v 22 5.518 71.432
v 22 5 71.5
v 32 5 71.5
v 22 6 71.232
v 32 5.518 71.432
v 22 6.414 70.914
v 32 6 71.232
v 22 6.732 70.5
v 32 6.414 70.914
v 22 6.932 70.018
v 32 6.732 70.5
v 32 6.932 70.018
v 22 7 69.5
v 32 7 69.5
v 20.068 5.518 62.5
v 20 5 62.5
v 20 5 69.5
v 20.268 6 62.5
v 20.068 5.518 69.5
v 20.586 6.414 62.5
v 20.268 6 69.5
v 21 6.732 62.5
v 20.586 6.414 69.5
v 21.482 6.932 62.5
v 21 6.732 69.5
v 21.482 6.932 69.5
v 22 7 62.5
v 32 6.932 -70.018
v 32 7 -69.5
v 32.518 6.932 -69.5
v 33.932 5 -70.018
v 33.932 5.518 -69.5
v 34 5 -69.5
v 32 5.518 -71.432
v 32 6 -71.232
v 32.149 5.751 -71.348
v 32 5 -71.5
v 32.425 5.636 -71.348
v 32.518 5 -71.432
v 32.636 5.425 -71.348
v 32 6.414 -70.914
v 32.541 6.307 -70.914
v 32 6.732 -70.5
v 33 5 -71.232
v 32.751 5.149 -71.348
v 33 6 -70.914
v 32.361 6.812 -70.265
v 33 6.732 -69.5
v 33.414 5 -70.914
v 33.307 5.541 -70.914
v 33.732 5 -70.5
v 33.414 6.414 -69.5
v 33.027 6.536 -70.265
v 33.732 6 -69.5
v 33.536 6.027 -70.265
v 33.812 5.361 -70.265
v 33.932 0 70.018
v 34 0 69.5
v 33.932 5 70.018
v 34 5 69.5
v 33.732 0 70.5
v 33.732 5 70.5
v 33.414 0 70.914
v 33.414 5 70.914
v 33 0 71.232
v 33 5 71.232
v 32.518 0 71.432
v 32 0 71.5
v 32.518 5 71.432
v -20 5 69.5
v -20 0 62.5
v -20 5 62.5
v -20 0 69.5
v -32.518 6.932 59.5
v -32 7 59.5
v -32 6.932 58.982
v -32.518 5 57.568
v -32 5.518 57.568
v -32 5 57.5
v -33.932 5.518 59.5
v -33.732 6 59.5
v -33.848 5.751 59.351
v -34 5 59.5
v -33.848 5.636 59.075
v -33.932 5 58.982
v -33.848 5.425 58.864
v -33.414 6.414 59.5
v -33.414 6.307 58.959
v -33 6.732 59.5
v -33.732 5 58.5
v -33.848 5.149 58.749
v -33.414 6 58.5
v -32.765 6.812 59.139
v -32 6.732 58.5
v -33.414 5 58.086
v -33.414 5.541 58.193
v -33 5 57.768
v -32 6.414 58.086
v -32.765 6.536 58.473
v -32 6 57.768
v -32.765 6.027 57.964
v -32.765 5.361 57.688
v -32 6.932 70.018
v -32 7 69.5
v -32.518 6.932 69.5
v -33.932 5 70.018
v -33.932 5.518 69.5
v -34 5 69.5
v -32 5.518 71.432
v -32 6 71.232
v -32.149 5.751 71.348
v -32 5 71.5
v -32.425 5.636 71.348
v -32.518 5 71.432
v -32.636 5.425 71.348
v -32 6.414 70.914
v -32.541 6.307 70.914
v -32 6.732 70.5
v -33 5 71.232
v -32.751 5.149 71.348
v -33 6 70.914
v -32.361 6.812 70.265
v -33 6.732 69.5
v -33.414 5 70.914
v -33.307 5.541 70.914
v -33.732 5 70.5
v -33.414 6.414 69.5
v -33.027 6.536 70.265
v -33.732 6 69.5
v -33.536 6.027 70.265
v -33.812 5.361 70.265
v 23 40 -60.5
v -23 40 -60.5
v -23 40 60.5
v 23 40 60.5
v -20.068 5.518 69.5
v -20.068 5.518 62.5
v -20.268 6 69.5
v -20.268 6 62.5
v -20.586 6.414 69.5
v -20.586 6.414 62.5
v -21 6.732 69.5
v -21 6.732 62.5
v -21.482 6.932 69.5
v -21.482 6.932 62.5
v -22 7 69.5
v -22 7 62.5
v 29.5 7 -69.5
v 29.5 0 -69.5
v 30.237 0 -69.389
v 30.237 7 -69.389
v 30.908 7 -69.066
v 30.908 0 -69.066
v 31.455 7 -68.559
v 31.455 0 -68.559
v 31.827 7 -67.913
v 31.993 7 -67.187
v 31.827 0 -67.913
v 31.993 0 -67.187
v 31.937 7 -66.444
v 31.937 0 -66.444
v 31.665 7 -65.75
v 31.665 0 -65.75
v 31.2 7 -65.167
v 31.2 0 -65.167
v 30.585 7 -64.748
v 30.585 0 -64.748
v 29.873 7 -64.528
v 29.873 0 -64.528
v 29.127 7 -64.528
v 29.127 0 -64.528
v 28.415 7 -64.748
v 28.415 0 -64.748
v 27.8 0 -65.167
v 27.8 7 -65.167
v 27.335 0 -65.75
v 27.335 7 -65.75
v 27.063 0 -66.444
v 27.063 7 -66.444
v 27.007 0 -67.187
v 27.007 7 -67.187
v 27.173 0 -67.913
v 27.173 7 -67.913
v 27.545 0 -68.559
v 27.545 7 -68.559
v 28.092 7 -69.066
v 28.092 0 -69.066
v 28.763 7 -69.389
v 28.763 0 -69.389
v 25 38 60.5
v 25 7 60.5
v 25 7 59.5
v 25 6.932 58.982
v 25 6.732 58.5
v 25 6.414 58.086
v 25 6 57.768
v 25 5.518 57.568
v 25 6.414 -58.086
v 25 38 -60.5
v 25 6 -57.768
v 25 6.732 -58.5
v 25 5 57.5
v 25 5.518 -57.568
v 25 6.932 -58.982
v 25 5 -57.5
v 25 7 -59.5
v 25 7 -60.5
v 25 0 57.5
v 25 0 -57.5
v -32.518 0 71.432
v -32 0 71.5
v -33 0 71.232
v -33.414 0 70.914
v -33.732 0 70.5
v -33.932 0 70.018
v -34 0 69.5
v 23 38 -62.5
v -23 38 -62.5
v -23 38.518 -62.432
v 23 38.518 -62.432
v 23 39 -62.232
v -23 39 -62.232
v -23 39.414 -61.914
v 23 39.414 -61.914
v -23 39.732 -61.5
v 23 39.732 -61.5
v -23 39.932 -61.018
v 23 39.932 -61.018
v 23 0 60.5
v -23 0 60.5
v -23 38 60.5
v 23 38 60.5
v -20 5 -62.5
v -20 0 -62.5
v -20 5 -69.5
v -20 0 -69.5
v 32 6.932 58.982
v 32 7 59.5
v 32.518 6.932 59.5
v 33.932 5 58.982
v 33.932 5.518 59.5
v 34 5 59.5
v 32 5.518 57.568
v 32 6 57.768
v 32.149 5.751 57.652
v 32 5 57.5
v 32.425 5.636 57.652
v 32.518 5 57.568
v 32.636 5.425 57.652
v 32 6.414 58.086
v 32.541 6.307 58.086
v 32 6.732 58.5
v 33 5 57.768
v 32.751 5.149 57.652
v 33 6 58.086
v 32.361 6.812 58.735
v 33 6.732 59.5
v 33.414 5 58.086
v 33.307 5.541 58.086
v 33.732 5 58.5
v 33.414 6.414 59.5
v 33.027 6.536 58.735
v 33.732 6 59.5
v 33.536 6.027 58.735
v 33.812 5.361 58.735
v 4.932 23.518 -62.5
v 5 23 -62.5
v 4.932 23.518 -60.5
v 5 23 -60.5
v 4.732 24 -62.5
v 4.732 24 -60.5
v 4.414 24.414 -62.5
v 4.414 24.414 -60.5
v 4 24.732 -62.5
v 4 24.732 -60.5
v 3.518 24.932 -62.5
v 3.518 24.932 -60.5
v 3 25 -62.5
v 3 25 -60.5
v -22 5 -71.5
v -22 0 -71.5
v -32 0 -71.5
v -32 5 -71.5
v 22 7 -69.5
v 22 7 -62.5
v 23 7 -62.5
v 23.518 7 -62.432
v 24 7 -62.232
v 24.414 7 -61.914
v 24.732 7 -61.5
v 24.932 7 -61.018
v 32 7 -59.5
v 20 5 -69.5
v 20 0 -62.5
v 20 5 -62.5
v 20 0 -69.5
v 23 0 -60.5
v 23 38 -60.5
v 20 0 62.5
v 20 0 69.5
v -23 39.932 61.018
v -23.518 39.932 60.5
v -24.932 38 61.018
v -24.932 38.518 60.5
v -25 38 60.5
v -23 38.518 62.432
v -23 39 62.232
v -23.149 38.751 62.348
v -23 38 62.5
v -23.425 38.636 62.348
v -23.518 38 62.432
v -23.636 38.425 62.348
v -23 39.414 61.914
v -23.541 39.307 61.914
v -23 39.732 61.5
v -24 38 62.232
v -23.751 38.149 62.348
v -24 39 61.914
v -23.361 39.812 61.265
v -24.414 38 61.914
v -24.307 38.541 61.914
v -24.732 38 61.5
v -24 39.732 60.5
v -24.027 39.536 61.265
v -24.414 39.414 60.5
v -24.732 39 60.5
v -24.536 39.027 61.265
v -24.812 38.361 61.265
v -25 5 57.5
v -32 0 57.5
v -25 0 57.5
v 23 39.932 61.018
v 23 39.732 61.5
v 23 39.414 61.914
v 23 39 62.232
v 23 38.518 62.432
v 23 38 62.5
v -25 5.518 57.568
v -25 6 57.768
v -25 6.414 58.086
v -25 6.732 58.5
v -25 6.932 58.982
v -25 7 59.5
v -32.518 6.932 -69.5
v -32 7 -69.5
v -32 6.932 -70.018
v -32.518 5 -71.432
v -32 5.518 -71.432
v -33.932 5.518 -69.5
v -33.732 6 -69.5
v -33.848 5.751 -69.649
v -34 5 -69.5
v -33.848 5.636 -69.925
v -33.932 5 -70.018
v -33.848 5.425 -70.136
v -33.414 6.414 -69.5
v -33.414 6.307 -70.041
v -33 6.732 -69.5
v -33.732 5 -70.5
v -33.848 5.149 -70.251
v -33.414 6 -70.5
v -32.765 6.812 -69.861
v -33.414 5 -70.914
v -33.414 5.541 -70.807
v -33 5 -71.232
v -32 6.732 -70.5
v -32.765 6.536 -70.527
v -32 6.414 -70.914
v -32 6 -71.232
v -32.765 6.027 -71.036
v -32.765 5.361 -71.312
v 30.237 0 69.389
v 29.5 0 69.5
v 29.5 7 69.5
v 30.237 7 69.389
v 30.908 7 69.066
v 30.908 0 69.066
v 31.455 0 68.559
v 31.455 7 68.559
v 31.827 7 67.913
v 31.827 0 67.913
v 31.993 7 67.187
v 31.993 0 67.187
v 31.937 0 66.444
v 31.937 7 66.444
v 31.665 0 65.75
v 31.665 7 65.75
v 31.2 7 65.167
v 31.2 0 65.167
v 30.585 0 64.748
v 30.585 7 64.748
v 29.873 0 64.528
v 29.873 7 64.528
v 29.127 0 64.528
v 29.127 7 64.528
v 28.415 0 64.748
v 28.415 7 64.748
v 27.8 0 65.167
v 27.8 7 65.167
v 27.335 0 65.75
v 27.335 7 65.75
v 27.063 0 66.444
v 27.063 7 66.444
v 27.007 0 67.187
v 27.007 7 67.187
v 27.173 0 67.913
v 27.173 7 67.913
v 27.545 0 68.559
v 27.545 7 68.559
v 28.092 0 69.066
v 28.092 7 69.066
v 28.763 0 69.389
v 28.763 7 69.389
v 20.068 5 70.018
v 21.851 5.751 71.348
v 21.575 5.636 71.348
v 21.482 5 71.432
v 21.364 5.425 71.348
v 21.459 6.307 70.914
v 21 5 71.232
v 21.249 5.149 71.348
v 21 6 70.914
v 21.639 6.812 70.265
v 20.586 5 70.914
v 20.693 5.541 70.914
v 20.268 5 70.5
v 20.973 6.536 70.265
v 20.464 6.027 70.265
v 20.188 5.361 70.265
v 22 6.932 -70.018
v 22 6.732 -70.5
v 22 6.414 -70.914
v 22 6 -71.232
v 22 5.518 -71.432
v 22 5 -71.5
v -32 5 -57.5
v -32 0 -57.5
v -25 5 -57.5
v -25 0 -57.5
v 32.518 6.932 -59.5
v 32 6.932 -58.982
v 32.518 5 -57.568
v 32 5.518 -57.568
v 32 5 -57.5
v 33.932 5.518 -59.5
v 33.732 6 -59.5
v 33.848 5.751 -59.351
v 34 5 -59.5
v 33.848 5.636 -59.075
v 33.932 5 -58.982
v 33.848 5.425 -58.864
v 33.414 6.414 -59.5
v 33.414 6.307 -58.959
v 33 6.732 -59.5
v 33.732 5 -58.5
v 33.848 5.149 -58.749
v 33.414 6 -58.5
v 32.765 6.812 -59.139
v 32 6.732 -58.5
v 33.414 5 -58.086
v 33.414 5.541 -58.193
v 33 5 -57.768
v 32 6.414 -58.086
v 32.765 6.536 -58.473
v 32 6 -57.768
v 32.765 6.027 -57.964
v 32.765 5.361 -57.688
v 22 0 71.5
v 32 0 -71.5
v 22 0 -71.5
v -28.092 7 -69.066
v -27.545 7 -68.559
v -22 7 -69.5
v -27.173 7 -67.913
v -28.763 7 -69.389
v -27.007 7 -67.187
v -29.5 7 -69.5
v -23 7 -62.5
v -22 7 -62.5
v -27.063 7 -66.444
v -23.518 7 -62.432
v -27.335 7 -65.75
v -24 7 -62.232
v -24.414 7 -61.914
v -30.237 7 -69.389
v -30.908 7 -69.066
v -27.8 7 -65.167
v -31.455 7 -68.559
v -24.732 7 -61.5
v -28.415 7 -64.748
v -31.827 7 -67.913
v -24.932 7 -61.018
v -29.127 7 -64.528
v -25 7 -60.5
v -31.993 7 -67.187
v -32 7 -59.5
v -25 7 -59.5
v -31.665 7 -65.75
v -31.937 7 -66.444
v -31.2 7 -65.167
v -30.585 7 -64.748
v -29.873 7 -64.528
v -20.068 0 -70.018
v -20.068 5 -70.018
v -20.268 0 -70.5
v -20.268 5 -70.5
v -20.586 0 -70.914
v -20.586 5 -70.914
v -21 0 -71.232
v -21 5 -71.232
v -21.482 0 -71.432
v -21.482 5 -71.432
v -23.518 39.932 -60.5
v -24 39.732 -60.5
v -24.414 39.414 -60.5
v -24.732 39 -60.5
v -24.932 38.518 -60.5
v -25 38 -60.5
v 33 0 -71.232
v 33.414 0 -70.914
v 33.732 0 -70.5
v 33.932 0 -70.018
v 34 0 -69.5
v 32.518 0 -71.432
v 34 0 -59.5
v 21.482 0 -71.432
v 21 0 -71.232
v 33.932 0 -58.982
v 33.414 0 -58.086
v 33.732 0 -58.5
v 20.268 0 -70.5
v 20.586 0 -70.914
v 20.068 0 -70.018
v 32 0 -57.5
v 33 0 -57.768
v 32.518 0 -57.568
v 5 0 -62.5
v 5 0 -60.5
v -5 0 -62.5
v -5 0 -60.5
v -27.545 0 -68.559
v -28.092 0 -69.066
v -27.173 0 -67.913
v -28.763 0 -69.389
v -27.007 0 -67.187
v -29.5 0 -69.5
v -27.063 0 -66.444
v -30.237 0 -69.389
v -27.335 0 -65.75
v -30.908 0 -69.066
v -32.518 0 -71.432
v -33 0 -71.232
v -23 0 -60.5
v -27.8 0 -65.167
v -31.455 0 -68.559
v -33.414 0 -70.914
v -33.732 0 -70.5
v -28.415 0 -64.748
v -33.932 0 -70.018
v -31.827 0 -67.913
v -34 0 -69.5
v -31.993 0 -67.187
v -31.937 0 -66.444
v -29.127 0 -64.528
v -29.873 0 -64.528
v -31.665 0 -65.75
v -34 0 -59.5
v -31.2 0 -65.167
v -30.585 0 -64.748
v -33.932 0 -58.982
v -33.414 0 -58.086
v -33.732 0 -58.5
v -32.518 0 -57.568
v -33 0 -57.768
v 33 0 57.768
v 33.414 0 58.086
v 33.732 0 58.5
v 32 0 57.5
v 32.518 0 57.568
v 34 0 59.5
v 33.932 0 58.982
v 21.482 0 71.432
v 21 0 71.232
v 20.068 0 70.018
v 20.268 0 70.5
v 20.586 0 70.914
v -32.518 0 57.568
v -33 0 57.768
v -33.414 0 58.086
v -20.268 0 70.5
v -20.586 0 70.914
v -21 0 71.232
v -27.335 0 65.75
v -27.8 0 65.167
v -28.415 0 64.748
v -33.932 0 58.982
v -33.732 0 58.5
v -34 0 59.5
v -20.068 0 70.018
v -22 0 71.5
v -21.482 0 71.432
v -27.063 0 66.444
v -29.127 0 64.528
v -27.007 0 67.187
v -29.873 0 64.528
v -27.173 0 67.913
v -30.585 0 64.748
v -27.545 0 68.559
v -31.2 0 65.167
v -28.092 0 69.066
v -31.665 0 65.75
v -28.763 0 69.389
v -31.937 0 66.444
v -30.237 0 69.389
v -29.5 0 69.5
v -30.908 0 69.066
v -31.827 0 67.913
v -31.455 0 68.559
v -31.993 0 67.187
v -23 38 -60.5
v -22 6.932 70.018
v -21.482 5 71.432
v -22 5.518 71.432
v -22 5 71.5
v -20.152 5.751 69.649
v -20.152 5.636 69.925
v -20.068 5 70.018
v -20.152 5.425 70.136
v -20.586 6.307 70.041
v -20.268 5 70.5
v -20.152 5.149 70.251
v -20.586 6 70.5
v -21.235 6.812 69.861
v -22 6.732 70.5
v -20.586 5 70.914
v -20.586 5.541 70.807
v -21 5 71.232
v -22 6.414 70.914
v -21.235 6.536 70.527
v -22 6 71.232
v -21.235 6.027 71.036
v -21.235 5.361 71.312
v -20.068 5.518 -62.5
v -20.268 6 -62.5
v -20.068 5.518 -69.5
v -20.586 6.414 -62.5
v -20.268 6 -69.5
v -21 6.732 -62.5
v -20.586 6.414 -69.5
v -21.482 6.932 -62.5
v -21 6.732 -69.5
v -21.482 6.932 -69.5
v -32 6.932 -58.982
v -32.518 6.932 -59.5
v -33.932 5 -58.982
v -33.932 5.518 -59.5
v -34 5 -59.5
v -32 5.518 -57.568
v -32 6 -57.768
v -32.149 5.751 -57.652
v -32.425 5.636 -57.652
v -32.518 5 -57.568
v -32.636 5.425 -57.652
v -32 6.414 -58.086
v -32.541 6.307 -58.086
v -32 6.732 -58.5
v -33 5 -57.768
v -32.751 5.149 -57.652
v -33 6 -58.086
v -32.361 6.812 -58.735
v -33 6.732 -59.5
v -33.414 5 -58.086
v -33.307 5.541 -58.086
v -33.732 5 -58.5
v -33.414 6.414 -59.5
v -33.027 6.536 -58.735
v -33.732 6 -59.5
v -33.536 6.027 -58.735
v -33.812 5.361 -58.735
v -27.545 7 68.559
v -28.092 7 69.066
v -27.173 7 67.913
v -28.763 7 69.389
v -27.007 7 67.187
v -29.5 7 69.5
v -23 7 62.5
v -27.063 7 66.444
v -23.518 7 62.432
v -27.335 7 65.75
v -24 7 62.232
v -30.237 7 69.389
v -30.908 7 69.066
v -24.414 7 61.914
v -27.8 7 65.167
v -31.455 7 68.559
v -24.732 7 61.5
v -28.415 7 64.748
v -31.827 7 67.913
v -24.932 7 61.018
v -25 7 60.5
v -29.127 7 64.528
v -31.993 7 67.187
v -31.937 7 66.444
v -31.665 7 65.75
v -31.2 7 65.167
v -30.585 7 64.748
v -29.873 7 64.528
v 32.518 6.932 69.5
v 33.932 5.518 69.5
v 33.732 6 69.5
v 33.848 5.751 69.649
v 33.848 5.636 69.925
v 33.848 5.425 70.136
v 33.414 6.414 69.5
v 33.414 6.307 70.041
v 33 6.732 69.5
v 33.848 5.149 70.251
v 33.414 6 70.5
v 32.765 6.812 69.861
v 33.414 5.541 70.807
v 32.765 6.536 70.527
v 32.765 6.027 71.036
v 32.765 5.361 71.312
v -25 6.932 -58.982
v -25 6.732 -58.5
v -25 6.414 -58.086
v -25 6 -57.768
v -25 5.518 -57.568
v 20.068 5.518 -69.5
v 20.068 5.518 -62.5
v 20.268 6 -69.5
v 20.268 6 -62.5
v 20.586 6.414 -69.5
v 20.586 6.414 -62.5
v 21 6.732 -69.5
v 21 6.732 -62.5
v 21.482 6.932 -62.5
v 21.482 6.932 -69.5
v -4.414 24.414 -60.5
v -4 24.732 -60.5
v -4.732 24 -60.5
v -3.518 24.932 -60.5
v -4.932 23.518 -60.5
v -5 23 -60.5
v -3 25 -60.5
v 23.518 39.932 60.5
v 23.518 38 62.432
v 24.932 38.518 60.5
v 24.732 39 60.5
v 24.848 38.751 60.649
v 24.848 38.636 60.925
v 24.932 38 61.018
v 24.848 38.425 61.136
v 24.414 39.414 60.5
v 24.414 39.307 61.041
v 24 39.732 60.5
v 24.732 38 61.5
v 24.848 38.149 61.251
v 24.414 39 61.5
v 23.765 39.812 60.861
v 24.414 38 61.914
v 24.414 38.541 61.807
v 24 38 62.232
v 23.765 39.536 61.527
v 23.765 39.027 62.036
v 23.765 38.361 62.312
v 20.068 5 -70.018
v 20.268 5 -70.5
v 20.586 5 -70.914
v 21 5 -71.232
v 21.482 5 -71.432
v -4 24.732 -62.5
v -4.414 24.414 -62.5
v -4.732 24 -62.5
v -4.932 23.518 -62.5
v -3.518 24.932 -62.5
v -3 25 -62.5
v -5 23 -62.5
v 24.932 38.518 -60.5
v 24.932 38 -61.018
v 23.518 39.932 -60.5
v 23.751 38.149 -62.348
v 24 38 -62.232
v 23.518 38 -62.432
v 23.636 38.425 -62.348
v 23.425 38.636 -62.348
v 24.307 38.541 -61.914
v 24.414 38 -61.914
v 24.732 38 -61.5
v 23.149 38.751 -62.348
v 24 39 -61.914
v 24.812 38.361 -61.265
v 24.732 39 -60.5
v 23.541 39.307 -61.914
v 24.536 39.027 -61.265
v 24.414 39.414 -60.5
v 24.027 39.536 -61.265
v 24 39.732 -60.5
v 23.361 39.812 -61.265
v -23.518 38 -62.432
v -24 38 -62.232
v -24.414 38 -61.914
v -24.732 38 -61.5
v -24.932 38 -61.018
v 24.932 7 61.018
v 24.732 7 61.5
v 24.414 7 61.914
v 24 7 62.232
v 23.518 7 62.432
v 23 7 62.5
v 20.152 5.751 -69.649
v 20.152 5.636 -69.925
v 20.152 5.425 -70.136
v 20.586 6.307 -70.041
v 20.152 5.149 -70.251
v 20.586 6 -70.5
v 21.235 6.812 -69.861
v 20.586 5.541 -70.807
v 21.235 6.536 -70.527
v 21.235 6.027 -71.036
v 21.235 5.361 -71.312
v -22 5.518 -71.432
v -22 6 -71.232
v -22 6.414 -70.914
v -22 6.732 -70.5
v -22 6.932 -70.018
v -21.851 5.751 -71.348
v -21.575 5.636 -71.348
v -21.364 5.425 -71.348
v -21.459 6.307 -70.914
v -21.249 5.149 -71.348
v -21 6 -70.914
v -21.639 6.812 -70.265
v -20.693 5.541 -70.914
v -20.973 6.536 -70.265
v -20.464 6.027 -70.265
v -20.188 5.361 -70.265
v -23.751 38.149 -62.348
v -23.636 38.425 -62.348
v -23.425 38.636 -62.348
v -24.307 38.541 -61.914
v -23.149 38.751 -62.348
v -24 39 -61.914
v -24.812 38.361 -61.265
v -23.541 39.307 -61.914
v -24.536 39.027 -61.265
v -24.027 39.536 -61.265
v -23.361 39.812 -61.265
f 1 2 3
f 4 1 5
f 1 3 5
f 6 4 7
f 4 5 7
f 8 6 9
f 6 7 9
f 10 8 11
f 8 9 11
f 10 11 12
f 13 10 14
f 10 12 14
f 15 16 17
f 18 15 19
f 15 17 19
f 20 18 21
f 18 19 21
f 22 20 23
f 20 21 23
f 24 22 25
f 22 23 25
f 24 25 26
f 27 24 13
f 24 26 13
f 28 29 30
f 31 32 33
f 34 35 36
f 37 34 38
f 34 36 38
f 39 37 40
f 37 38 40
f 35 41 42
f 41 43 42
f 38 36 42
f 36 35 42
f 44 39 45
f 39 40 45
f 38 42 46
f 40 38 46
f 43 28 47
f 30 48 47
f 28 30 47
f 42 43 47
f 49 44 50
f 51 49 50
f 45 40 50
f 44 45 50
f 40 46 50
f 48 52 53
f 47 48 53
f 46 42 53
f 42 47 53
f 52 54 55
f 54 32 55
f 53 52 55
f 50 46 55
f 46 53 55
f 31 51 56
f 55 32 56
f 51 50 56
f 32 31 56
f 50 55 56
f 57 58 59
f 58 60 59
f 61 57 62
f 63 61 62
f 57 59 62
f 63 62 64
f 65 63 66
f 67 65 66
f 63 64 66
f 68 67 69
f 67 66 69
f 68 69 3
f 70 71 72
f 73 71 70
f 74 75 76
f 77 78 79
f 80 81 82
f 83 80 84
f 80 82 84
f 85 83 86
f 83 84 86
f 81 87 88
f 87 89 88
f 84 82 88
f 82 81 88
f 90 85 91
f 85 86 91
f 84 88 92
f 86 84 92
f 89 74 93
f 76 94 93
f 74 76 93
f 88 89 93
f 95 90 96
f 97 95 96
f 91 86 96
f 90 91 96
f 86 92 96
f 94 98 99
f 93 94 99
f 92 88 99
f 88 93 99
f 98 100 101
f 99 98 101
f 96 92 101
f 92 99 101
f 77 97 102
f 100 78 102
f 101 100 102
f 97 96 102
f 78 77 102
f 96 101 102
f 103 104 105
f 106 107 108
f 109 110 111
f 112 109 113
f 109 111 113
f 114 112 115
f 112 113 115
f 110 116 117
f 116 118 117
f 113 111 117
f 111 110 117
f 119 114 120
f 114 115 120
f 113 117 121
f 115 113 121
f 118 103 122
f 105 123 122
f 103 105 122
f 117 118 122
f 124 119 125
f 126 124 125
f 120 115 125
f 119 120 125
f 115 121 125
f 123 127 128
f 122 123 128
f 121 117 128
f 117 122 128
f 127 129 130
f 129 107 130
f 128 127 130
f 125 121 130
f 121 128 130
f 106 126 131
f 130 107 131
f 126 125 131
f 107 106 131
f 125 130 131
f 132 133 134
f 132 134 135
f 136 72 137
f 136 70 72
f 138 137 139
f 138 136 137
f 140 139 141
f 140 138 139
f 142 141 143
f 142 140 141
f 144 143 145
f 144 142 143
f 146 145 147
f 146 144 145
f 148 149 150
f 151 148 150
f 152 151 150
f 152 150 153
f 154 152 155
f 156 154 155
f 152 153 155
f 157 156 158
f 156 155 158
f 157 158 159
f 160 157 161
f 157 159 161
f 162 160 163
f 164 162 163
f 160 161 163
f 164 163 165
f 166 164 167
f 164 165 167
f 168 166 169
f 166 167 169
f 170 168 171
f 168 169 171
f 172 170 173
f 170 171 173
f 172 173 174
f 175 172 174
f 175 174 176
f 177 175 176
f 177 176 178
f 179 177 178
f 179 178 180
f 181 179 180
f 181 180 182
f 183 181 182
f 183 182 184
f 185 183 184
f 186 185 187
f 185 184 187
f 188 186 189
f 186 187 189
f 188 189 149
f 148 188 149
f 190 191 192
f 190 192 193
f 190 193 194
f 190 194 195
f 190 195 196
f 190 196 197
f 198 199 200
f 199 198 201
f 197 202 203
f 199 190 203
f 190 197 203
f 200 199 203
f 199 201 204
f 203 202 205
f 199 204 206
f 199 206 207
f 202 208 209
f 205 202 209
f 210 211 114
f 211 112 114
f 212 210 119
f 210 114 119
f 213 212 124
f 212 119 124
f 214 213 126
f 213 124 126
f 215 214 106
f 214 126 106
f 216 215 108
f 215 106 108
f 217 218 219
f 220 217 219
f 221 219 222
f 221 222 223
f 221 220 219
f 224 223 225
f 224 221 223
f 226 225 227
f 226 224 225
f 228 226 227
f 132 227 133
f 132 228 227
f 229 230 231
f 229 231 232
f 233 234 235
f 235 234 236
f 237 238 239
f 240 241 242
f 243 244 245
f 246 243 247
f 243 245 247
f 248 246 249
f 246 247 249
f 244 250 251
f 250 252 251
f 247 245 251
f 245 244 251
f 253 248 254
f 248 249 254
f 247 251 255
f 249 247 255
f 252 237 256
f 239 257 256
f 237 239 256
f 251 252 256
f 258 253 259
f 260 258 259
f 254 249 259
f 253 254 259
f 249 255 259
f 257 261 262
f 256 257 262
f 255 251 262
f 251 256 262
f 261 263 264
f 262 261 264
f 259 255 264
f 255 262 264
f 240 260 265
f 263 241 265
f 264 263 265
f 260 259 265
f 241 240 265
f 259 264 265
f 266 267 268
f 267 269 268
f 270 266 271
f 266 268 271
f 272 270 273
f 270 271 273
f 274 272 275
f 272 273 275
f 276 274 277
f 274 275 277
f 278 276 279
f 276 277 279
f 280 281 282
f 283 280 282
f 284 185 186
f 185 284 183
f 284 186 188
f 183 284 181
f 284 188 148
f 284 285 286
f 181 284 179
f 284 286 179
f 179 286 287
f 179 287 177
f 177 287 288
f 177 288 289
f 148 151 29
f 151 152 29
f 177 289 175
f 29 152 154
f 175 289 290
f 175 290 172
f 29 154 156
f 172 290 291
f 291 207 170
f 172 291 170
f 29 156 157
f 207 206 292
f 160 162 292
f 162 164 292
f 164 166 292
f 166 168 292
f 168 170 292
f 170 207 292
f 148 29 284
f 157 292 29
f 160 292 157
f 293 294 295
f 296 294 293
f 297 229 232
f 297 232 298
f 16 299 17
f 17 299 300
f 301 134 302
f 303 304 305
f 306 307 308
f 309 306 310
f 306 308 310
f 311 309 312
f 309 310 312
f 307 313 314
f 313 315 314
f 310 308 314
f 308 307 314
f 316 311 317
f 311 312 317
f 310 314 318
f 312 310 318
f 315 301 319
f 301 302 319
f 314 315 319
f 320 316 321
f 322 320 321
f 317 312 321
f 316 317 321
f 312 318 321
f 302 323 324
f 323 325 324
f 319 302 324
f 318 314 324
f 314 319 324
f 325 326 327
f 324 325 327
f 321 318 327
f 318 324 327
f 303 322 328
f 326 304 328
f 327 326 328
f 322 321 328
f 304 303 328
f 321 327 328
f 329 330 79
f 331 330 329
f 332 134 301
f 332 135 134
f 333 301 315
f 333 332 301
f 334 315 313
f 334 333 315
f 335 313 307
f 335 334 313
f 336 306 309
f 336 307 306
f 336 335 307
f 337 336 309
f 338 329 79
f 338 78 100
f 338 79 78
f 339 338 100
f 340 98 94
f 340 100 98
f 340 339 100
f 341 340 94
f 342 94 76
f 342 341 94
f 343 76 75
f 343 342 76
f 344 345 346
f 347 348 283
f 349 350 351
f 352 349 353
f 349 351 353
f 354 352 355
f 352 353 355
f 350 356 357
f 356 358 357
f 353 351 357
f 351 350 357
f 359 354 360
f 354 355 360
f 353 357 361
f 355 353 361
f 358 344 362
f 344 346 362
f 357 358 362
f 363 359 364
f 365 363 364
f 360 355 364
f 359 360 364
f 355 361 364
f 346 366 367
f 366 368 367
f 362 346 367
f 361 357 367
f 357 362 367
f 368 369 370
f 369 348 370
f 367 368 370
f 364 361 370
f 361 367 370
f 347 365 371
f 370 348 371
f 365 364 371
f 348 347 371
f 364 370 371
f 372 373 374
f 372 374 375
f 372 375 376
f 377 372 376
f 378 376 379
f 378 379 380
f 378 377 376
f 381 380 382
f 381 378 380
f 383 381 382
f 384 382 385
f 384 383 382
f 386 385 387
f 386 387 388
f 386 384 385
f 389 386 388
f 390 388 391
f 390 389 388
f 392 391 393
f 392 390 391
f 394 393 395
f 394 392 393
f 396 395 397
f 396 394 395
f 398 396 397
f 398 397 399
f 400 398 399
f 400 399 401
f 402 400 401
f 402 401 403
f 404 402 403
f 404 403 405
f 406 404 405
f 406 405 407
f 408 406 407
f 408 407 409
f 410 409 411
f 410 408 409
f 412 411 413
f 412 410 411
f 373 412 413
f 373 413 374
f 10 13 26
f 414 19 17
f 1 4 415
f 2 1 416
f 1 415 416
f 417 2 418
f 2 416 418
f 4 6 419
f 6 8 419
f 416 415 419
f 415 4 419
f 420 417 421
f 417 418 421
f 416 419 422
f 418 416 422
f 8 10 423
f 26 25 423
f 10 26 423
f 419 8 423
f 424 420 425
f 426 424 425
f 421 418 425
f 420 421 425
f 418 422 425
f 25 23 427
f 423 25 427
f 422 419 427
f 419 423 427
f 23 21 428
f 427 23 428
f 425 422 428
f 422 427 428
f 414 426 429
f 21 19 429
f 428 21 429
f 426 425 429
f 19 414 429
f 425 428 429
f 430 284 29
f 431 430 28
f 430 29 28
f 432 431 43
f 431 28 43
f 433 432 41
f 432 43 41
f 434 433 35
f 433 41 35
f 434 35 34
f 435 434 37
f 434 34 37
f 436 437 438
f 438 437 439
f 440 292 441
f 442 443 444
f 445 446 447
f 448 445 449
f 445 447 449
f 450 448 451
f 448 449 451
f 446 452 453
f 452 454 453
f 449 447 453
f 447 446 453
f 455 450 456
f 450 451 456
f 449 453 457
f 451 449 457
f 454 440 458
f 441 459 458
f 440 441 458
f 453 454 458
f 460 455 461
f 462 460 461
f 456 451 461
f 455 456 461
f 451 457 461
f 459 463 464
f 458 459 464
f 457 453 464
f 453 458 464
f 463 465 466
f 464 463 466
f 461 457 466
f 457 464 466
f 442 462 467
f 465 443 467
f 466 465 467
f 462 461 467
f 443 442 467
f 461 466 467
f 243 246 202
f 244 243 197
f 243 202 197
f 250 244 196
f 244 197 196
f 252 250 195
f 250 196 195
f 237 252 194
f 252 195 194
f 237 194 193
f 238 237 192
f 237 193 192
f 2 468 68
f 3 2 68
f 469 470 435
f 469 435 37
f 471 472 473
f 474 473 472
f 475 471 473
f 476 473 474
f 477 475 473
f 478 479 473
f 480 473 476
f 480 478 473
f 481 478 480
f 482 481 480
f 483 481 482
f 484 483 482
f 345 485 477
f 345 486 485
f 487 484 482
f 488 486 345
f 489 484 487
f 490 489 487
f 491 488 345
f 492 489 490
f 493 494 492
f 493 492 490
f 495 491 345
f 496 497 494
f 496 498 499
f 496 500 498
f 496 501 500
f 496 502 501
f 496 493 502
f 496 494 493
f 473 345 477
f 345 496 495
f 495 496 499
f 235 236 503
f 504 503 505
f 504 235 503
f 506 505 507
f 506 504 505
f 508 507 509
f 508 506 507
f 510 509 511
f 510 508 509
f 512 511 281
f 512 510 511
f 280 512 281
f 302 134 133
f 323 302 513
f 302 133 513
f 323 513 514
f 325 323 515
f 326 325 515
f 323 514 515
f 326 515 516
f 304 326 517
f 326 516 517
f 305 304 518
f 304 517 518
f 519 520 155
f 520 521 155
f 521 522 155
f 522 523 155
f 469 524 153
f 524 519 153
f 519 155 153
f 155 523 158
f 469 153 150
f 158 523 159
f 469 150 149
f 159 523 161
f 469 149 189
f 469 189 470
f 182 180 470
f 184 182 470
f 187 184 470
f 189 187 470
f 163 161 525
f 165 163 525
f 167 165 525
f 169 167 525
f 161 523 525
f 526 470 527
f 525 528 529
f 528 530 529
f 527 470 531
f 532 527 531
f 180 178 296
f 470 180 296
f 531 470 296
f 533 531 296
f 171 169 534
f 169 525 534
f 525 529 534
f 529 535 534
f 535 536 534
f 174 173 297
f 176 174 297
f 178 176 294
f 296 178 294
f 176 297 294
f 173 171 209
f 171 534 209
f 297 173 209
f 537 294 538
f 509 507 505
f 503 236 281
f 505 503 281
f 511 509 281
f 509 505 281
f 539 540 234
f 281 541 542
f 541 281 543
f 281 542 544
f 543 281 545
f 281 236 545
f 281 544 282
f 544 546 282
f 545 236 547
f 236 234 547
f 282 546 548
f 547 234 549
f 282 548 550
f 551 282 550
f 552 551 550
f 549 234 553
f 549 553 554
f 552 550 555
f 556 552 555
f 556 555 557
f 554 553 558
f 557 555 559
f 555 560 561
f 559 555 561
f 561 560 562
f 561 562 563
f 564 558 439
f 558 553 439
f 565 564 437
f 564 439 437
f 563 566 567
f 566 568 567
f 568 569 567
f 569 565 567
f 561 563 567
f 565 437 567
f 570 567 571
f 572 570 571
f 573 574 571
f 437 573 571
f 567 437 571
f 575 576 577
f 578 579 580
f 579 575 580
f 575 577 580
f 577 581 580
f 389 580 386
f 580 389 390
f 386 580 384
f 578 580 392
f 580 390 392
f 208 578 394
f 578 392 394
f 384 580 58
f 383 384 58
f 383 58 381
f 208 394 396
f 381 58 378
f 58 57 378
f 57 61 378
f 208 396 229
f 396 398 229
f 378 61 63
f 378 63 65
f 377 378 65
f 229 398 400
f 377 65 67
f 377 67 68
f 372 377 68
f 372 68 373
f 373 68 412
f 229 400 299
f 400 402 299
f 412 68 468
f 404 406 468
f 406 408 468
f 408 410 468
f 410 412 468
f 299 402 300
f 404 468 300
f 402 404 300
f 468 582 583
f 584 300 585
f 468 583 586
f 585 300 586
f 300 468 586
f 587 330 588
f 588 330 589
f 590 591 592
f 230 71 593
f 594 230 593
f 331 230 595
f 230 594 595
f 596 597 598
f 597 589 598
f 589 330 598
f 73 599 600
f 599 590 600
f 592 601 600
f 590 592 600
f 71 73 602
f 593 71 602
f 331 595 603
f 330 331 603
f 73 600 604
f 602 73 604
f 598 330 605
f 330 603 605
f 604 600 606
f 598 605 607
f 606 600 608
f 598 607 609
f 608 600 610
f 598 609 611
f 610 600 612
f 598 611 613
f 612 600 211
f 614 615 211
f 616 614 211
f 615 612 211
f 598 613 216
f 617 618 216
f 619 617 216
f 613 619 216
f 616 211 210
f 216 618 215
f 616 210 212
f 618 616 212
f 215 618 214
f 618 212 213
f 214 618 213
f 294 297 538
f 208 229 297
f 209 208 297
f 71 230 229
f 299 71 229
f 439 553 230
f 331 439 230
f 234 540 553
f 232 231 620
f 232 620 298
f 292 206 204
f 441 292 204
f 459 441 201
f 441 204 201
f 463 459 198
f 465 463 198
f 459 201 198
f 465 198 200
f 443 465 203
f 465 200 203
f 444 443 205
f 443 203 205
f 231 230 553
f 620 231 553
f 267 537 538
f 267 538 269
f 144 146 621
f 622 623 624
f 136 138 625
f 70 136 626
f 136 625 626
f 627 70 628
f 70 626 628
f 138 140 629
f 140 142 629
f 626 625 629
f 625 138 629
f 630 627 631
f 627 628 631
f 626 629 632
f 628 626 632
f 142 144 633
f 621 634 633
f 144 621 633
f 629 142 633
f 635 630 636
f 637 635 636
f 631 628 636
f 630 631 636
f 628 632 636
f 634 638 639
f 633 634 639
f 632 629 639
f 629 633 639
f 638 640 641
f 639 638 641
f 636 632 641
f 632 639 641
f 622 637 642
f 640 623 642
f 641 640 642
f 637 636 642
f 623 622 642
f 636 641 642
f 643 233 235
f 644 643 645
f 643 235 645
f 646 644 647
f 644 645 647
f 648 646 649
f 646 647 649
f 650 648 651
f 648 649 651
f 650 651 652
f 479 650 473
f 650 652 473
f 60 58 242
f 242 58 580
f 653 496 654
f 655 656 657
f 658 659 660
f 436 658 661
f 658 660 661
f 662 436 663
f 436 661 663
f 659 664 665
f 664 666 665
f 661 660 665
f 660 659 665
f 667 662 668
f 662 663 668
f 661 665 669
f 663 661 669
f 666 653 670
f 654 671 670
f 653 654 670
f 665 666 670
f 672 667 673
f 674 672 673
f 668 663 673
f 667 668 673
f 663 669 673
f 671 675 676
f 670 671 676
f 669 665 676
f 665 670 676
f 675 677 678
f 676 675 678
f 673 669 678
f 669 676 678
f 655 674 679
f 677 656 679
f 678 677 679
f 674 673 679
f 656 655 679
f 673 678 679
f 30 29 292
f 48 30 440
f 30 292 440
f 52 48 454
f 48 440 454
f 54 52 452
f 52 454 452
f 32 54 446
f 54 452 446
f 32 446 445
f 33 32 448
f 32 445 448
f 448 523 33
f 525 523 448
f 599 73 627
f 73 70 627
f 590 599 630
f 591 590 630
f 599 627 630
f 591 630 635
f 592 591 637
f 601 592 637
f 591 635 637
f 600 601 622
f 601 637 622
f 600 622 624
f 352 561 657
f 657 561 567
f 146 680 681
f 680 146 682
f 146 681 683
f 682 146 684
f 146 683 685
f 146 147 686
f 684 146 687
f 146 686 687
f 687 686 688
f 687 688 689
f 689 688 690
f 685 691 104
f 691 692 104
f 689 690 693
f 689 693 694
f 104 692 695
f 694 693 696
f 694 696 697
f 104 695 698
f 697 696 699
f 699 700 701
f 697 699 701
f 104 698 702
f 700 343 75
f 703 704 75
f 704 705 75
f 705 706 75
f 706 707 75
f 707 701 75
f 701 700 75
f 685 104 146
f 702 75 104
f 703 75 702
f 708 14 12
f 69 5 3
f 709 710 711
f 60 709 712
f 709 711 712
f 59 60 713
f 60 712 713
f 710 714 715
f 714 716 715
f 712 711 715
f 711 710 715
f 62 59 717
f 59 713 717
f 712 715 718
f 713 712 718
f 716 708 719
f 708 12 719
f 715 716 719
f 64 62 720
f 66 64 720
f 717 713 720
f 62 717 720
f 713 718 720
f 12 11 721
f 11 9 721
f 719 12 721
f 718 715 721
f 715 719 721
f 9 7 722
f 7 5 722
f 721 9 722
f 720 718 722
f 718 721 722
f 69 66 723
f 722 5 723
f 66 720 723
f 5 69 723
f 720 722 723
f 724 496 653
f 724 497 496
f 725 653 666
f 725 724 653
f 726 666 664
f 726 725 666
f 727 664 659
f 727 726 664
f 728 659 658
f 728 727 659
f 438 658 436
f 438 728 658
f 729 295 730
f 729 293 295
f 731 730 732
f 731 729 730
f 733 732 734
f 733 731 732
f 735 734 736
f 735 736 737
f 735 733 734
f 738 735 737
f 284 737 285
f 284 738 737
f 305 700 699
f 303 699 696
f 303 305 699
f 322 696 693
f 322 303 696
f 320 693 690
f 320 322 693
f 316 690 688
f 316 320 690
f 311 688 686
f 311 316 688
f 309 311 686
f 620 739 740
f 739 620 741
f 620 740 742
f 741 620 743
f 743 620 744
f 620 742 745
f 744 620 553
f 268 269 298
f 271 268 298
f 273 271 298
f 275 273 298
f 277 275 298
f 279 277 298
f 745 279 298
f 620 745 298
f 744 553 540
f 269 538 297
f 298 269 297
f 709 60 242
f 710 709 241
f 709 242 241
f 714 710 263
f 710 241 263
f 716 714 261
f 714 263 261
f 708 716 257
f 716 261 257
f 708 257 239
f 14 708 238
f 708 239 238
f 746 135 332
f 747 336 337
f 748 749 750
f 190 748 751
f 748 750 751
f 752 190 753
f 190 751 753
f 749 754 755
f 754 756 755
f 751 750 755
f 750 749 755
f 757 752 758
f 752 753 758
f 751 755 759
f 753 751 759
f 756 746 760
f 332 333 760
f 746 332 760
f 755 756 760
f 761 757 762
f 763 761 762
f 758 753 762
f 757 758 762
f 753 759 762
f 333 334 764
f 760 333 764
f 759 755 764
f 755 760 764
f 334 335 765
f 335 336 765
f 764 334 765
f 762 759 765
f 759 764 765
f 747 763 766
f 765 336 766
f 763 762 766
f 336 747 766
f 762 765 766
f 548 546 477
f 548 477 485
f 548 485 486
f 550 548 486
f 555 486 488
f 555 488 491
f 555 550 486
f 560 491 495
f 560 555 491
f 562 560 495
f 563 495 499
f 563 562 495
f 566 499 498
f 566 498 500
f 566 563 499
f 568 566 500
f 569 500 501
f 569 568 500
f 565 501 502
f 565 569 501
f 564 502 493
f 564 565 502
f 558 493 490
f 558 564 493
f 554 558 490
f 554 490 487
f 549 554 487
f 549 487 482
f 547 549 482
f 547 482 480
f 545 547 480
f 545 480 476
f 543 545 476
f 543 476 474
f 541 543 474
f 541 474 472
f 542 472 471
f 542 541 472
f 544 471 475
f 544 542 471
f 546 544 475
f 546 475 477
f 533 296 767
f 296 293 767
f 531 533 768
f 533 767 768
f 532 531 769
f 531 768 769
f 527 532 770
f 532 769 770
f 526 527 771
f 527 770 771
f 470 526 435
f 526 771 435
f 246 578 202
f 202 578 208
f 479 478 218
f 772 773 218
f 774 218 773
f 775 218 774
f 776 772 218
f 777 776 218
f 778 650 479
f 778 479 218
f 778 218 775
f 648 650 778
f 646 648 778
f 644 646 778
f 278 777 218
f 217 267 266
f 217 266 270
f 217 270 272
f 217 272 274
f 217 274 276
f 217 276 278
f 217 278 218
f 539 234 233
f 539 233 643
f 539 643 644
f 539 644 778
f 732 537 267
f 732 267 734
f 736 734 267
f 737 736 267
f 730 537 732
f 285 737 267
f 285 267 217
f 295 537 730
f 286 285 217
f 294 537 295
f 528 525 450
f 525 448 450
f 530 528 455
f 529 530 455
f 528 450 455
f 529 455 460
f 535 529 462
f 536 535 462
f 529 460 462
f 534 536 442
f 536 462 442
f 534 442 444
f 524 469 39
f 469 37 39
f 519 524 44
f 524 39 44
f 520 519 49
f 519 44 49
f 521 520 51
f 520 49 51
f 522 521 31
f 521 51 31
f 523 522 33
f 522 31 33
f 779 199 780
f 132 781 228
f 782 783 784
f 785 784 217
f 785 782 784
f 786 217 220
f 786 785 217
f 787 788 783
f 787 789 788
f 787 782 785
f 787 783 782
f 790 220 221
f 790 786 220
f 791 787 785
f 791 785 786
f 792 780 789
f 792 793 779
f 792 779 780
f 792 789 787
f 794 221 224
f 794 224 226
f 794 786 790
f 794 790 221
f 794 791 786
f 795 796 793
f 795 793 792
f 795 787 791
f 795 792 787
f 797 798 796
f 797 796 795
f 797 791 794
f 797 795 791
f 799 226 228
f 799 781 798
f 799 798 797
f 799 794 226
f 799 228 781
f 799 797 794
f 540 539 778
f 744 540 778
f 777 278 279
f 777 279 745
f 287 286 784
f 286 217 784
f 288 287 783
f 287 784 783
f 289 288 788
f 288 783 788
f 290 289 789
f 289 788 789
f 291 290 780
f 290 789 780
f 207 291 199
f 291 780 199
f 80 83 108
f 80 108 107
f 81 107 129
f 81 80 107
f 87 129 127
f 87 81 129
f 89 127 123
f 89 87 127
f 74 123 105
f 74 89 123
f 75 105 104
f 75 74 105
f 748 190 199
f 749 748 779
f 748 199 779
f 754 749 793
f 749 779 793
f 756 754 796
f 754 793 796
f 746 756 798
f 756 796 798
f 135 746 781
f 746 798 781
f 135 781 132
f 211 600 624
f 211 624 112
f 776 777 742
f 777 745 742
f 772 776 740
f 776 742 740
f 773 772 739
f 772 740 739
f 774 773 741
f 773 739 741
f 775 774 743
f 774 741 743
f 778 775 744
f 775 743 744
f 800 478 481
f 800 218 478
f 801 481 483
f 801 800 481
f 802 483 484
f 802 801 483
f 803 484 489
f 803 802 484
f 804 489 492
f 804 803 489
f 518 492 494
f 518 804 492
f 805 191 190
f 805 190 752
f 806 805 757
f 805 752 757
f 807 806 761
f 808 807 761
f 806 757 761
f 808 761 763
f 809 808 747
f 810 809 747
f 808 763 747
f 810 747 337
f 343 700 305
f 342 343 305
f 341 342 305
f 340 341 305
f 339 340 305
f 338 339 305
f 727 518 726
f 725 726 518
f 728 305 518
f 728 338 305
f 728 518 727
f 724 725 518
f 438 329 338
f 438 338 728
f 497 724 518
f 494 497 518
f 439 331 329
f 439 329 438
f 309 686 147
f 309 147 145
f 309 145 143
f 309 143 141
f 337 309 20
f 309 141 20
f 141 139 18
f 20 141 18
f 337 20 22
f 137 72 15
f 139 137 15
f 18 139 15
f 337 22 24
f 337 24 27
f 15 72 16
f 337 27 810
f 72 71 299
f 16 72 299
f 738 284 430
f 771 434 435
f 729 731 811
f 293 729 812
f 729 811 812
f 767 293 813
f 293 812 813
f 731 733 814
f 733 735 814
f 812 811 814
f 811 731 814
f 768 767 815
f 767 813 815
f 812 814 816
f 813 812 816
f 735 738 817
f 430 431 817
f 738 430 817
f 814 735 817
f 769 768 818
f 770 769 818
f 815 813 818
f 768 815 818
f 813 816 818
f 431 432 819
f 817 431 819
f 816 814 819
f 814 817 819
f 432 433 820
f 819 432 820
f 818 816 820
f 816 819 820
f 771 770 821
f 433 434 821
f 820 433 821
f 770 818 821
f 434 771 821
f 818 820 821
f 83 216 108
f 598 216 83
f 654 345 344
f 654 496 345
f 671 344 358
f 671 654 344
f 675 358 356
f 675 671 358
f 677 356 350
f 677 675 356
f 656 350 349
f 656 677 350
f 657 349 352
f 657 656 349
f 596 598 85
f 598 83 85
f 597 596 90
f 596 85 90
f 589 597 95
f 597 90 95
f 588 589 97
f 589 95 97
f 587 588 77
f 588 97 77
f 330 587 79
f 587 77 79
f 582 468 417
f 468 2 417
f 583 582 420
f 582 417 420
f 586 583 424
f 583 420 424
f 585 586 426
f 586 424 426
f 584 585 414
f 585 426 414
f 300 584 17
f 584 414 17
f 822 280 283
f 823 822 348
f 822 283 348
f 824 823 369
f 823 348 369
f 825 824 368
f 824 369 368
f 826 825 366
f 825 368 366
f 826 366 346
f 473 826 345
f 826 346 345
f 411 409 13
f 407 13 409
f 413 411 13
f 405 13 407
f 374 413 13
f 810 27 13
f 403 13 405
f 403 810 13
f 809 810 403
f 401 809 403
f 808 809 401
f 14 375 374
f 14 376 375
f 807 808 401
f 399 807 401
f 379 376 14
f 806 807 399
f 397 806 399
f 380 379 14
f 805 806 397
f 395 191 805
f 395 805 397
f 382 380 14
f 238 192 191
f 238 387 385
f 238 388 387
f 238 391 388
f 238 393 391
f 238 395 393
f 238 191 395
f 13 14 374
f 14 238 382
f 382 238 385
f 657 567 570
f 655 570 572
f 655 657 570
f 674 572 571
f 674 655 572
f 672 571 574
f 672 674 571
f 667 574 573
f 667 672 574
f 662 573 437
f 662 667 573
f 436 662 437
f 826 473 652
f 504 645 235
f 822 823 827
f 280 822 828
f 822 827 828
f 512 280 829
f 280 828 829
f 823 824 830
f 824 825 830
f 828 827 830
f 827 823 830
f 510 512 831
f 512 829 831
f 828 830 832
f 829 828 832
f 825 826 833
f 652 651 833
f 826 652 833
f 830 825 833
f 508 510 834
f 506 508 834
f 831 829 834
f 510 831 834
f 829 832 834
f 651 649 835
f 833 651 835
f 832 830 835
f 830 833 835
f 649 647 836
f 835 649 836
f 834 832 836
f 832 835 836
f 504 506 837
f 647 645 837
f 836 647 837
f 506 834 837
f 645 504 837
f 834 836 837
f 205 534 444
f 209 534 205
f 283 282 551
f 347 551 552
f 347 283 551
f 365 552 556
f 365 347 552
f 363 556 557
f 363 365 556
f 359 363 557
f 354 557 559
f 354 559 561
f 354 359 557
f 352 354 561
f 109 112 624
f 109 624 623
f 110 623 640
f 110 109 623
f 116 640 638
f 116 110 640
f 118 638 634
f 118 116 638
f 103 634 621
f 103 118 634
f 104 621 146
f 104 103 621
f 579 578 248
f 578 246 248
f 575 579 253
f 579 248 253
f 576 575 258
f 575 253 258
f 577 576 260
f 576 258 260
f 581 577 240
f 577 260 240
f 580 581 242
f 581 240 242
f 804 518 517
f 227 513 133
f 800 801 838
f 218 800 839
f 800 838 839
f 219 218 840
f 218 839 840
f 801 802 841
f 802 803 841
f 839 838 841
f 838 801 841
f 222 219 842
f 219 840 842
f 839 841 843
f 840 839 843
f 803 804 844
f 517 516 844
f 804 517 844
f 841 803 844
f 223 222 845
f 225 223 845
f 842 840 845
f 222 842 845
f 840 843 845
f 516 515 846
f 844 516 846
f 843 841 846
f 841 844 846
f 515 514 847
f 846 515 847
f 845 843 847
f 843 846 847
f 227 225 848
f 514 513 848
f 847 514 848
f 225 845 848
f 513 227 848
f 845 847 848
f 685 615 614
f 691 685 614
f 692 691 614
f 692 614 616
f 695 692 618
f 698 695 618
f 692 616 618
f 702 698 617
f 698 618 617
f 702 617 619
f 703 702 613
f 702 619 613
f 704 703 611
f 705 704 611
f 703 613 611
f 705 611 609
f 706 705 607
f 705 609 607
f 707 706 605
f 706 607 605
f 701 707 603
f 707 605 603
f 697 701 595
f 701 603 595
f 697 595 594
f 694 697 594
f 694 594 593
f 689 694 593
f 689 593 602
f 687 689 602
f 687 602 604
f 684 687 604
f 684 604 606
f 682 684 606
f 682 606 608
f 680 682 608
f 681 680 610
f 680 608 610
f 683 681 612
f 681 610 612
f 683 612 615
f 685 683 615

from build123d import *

# Parameters (mm, degrees)
SKETCH1_W                                  = 50
SKETCH1_H                                  = 125
BOSS_EXTRUDE1_DEPTH                        = 40
SHELL2_T                                   = -2
SKETCH3_R                                  = 2.5
BOSS_EXTRUDE2_DEPTH                        = 7
MIRROR2_AT_THE_SECOND_PLANE_COPY_1_SKETC_R = 2.5
MIRROR2_AT_THE_SECOND_PLANE_COPY_1_DEPTH   = 7
CUT_EXTRUDE1_REACH                         = 145.917
SKETCH4_W                                  = 10
SKETCH4_H                                  = 25
FILLET2_R                                  = 2
FILLET3_R                                  = 2


with BuildPart() as part:
    # Sketch1 → Boss-Extrude1 (new body)
    with BuildSketch(Plane(origin=(0, 0, 0), x_dir=(1, 0, 0), z_dir=(0, 1, 0))):
        Rectangle(SKETCH1_W, SKETCH1_H)
    extrude(amount=BOSS_EXTRUDE1_DEPTH)

    # Shell2
    shell2_openings = [part.faces().sort_by_distance(p)[0] for p in [
        (0, 0, 0),
    ]]
    offset(amount=SHELL2_T, openings=shell2_openings, kind=Kind.INTERSECTION)

    # Sketch3 → Boss-Extrude2 (add)
    with BuildSketch(Plane(origin=(0, 0, 0), x_dir=(1, 0, 0), z_dir=(0, 1, 0))):
        Polygon((25, -62.5), (20, -62.5), (20, -71.5), (34, -71.5), (34, -57.5), (25, -57.5), align=None)
        with Locations(Location((29.5, -67, 0), (0, 0, 270))):
            Circle(SKETCH3_R, mode=Mode.SUBTRACT)
    boss_extrude2 = extrude(amount=BOSS_EXTRUDE2_DEPTH)

    # Mirror2: Boss-Extrude2 across plane
    add(boss_extrude2.mirror(Plane.XY))

    # Mirror2 at the second plane: Boss-Extrude2 across plane
    add(boss_extrude2.mirror(Plane(origin=(0, 0, 0), x_dir=(0, 0, 1), z_dir=(1, 0, 0))))

    # Mirror2 at the second plane copy 1 sketc → Mirror2 at the second plane copy 1 (add)
    with BuildSketch(Plane(origin=(0, 0, 0), x_dir=(-1, 0, 0), z_dir=(0, 1, 0))):
        Polygon((25, -62.5), (20, -62.5), (20, -71.5), (34, -71.5), (34, -57.5), (25, -57.5), align=None)
        with Locations(Location((29.5, -67, 0), (0, 0, 270))):
            Circle(MIRROR2_AT_THE_SECOND_PLANE_COPY_1_SKETC_R, mode=Mode.SUBTRACT)
    extrude(amount=MIRROR2_AT_THE_SECOND_PLANE_COPY_1_DEPTH)

    # Sketch4 → Cut-Extrude1 (cut, up to next)
    with BuildSketch(Plane(origin=(0, 0, -62.5), x_dir=(-1, 0, 0), z_dir=(0, 0, -1)), mode=Mode.PRIVATE) as cut_extrude1_sk1:
        with Locations((0, 12.5)):
            Rectangle(SKETCH4_W, SKETCH4_H)
    cut_extrude1_tool1 = extrude(cut_extrude1_sk1.sketch, amount=-CUT_EXTRUDE1_REACH, mode=Mode.PRIVATE) & part.part
    add(cut_extrude1_tool1.solids().sort_by_distance((0, 12.5, -62.5))[0], mode=Mode.SUBTRACT)

    # Fillet2
    fillet2_edges = [part.edges().sort_by_distance(p)[0] for p in [
        (-25, 40, 0),
        (0, 40, 62.5),
        (20, 7, 67),
        (27, 7, 71.5),
        (34, 7, 64.5),
        (29.5, 7, 57.5),
        (20, 3.5, 71.5),
        (34, 3.5, 71.5),
        (34, 3.5, 57.5),
        (-29.5, 7, 57.5),
        (-34, 7, 64.5),
        (-34, 3.5, 57.5),
        (25, 40, 0),
        (-27, 7, 71.5),
        (-34, 3.5, 71.5),
        (-20, 7, 67),
        (-20, 3.5, 71.5),
        (29.5, 7, -57.5),
        (34, 7, -64.5),
        (34, 3.5, -57.5),
        (27, 7, -71.5),
        (34, 3.5, -71.5),
        (20, 7, -67),
        (20, 3.5, -71.5),
        (25, 23.5, 62.5),
        (-25, 23.5, 62.5),
        (-25, 23.5, -62.5),
        (25, 23.5, -62.5),
        (-20, 7, -67),
        (-27, 7, -71.5),
        (-34, 7, -64.5),
        (-29.5, 7, -57.5),
        (-20, 3.5, -71.5),
        (-34, 3.5, -71.5),
        (-34, 3.5, -57.5),
        (0, 40, -62.5),
    ]]
    fillet(fillet2_edges, radius=FILLET2_R - 0.0001)  # a hair under: the kernel refuses the full size

    # Fillet3
    fillet3_edges = [part.edges().sort_by_distance(p)[0] for p in [
        (5, 25, -61.5),
        (-5, 25, -61.5),
    ]]
    fillet(fillet3_edges, radius=FILLET3_R)


solid = part.part
